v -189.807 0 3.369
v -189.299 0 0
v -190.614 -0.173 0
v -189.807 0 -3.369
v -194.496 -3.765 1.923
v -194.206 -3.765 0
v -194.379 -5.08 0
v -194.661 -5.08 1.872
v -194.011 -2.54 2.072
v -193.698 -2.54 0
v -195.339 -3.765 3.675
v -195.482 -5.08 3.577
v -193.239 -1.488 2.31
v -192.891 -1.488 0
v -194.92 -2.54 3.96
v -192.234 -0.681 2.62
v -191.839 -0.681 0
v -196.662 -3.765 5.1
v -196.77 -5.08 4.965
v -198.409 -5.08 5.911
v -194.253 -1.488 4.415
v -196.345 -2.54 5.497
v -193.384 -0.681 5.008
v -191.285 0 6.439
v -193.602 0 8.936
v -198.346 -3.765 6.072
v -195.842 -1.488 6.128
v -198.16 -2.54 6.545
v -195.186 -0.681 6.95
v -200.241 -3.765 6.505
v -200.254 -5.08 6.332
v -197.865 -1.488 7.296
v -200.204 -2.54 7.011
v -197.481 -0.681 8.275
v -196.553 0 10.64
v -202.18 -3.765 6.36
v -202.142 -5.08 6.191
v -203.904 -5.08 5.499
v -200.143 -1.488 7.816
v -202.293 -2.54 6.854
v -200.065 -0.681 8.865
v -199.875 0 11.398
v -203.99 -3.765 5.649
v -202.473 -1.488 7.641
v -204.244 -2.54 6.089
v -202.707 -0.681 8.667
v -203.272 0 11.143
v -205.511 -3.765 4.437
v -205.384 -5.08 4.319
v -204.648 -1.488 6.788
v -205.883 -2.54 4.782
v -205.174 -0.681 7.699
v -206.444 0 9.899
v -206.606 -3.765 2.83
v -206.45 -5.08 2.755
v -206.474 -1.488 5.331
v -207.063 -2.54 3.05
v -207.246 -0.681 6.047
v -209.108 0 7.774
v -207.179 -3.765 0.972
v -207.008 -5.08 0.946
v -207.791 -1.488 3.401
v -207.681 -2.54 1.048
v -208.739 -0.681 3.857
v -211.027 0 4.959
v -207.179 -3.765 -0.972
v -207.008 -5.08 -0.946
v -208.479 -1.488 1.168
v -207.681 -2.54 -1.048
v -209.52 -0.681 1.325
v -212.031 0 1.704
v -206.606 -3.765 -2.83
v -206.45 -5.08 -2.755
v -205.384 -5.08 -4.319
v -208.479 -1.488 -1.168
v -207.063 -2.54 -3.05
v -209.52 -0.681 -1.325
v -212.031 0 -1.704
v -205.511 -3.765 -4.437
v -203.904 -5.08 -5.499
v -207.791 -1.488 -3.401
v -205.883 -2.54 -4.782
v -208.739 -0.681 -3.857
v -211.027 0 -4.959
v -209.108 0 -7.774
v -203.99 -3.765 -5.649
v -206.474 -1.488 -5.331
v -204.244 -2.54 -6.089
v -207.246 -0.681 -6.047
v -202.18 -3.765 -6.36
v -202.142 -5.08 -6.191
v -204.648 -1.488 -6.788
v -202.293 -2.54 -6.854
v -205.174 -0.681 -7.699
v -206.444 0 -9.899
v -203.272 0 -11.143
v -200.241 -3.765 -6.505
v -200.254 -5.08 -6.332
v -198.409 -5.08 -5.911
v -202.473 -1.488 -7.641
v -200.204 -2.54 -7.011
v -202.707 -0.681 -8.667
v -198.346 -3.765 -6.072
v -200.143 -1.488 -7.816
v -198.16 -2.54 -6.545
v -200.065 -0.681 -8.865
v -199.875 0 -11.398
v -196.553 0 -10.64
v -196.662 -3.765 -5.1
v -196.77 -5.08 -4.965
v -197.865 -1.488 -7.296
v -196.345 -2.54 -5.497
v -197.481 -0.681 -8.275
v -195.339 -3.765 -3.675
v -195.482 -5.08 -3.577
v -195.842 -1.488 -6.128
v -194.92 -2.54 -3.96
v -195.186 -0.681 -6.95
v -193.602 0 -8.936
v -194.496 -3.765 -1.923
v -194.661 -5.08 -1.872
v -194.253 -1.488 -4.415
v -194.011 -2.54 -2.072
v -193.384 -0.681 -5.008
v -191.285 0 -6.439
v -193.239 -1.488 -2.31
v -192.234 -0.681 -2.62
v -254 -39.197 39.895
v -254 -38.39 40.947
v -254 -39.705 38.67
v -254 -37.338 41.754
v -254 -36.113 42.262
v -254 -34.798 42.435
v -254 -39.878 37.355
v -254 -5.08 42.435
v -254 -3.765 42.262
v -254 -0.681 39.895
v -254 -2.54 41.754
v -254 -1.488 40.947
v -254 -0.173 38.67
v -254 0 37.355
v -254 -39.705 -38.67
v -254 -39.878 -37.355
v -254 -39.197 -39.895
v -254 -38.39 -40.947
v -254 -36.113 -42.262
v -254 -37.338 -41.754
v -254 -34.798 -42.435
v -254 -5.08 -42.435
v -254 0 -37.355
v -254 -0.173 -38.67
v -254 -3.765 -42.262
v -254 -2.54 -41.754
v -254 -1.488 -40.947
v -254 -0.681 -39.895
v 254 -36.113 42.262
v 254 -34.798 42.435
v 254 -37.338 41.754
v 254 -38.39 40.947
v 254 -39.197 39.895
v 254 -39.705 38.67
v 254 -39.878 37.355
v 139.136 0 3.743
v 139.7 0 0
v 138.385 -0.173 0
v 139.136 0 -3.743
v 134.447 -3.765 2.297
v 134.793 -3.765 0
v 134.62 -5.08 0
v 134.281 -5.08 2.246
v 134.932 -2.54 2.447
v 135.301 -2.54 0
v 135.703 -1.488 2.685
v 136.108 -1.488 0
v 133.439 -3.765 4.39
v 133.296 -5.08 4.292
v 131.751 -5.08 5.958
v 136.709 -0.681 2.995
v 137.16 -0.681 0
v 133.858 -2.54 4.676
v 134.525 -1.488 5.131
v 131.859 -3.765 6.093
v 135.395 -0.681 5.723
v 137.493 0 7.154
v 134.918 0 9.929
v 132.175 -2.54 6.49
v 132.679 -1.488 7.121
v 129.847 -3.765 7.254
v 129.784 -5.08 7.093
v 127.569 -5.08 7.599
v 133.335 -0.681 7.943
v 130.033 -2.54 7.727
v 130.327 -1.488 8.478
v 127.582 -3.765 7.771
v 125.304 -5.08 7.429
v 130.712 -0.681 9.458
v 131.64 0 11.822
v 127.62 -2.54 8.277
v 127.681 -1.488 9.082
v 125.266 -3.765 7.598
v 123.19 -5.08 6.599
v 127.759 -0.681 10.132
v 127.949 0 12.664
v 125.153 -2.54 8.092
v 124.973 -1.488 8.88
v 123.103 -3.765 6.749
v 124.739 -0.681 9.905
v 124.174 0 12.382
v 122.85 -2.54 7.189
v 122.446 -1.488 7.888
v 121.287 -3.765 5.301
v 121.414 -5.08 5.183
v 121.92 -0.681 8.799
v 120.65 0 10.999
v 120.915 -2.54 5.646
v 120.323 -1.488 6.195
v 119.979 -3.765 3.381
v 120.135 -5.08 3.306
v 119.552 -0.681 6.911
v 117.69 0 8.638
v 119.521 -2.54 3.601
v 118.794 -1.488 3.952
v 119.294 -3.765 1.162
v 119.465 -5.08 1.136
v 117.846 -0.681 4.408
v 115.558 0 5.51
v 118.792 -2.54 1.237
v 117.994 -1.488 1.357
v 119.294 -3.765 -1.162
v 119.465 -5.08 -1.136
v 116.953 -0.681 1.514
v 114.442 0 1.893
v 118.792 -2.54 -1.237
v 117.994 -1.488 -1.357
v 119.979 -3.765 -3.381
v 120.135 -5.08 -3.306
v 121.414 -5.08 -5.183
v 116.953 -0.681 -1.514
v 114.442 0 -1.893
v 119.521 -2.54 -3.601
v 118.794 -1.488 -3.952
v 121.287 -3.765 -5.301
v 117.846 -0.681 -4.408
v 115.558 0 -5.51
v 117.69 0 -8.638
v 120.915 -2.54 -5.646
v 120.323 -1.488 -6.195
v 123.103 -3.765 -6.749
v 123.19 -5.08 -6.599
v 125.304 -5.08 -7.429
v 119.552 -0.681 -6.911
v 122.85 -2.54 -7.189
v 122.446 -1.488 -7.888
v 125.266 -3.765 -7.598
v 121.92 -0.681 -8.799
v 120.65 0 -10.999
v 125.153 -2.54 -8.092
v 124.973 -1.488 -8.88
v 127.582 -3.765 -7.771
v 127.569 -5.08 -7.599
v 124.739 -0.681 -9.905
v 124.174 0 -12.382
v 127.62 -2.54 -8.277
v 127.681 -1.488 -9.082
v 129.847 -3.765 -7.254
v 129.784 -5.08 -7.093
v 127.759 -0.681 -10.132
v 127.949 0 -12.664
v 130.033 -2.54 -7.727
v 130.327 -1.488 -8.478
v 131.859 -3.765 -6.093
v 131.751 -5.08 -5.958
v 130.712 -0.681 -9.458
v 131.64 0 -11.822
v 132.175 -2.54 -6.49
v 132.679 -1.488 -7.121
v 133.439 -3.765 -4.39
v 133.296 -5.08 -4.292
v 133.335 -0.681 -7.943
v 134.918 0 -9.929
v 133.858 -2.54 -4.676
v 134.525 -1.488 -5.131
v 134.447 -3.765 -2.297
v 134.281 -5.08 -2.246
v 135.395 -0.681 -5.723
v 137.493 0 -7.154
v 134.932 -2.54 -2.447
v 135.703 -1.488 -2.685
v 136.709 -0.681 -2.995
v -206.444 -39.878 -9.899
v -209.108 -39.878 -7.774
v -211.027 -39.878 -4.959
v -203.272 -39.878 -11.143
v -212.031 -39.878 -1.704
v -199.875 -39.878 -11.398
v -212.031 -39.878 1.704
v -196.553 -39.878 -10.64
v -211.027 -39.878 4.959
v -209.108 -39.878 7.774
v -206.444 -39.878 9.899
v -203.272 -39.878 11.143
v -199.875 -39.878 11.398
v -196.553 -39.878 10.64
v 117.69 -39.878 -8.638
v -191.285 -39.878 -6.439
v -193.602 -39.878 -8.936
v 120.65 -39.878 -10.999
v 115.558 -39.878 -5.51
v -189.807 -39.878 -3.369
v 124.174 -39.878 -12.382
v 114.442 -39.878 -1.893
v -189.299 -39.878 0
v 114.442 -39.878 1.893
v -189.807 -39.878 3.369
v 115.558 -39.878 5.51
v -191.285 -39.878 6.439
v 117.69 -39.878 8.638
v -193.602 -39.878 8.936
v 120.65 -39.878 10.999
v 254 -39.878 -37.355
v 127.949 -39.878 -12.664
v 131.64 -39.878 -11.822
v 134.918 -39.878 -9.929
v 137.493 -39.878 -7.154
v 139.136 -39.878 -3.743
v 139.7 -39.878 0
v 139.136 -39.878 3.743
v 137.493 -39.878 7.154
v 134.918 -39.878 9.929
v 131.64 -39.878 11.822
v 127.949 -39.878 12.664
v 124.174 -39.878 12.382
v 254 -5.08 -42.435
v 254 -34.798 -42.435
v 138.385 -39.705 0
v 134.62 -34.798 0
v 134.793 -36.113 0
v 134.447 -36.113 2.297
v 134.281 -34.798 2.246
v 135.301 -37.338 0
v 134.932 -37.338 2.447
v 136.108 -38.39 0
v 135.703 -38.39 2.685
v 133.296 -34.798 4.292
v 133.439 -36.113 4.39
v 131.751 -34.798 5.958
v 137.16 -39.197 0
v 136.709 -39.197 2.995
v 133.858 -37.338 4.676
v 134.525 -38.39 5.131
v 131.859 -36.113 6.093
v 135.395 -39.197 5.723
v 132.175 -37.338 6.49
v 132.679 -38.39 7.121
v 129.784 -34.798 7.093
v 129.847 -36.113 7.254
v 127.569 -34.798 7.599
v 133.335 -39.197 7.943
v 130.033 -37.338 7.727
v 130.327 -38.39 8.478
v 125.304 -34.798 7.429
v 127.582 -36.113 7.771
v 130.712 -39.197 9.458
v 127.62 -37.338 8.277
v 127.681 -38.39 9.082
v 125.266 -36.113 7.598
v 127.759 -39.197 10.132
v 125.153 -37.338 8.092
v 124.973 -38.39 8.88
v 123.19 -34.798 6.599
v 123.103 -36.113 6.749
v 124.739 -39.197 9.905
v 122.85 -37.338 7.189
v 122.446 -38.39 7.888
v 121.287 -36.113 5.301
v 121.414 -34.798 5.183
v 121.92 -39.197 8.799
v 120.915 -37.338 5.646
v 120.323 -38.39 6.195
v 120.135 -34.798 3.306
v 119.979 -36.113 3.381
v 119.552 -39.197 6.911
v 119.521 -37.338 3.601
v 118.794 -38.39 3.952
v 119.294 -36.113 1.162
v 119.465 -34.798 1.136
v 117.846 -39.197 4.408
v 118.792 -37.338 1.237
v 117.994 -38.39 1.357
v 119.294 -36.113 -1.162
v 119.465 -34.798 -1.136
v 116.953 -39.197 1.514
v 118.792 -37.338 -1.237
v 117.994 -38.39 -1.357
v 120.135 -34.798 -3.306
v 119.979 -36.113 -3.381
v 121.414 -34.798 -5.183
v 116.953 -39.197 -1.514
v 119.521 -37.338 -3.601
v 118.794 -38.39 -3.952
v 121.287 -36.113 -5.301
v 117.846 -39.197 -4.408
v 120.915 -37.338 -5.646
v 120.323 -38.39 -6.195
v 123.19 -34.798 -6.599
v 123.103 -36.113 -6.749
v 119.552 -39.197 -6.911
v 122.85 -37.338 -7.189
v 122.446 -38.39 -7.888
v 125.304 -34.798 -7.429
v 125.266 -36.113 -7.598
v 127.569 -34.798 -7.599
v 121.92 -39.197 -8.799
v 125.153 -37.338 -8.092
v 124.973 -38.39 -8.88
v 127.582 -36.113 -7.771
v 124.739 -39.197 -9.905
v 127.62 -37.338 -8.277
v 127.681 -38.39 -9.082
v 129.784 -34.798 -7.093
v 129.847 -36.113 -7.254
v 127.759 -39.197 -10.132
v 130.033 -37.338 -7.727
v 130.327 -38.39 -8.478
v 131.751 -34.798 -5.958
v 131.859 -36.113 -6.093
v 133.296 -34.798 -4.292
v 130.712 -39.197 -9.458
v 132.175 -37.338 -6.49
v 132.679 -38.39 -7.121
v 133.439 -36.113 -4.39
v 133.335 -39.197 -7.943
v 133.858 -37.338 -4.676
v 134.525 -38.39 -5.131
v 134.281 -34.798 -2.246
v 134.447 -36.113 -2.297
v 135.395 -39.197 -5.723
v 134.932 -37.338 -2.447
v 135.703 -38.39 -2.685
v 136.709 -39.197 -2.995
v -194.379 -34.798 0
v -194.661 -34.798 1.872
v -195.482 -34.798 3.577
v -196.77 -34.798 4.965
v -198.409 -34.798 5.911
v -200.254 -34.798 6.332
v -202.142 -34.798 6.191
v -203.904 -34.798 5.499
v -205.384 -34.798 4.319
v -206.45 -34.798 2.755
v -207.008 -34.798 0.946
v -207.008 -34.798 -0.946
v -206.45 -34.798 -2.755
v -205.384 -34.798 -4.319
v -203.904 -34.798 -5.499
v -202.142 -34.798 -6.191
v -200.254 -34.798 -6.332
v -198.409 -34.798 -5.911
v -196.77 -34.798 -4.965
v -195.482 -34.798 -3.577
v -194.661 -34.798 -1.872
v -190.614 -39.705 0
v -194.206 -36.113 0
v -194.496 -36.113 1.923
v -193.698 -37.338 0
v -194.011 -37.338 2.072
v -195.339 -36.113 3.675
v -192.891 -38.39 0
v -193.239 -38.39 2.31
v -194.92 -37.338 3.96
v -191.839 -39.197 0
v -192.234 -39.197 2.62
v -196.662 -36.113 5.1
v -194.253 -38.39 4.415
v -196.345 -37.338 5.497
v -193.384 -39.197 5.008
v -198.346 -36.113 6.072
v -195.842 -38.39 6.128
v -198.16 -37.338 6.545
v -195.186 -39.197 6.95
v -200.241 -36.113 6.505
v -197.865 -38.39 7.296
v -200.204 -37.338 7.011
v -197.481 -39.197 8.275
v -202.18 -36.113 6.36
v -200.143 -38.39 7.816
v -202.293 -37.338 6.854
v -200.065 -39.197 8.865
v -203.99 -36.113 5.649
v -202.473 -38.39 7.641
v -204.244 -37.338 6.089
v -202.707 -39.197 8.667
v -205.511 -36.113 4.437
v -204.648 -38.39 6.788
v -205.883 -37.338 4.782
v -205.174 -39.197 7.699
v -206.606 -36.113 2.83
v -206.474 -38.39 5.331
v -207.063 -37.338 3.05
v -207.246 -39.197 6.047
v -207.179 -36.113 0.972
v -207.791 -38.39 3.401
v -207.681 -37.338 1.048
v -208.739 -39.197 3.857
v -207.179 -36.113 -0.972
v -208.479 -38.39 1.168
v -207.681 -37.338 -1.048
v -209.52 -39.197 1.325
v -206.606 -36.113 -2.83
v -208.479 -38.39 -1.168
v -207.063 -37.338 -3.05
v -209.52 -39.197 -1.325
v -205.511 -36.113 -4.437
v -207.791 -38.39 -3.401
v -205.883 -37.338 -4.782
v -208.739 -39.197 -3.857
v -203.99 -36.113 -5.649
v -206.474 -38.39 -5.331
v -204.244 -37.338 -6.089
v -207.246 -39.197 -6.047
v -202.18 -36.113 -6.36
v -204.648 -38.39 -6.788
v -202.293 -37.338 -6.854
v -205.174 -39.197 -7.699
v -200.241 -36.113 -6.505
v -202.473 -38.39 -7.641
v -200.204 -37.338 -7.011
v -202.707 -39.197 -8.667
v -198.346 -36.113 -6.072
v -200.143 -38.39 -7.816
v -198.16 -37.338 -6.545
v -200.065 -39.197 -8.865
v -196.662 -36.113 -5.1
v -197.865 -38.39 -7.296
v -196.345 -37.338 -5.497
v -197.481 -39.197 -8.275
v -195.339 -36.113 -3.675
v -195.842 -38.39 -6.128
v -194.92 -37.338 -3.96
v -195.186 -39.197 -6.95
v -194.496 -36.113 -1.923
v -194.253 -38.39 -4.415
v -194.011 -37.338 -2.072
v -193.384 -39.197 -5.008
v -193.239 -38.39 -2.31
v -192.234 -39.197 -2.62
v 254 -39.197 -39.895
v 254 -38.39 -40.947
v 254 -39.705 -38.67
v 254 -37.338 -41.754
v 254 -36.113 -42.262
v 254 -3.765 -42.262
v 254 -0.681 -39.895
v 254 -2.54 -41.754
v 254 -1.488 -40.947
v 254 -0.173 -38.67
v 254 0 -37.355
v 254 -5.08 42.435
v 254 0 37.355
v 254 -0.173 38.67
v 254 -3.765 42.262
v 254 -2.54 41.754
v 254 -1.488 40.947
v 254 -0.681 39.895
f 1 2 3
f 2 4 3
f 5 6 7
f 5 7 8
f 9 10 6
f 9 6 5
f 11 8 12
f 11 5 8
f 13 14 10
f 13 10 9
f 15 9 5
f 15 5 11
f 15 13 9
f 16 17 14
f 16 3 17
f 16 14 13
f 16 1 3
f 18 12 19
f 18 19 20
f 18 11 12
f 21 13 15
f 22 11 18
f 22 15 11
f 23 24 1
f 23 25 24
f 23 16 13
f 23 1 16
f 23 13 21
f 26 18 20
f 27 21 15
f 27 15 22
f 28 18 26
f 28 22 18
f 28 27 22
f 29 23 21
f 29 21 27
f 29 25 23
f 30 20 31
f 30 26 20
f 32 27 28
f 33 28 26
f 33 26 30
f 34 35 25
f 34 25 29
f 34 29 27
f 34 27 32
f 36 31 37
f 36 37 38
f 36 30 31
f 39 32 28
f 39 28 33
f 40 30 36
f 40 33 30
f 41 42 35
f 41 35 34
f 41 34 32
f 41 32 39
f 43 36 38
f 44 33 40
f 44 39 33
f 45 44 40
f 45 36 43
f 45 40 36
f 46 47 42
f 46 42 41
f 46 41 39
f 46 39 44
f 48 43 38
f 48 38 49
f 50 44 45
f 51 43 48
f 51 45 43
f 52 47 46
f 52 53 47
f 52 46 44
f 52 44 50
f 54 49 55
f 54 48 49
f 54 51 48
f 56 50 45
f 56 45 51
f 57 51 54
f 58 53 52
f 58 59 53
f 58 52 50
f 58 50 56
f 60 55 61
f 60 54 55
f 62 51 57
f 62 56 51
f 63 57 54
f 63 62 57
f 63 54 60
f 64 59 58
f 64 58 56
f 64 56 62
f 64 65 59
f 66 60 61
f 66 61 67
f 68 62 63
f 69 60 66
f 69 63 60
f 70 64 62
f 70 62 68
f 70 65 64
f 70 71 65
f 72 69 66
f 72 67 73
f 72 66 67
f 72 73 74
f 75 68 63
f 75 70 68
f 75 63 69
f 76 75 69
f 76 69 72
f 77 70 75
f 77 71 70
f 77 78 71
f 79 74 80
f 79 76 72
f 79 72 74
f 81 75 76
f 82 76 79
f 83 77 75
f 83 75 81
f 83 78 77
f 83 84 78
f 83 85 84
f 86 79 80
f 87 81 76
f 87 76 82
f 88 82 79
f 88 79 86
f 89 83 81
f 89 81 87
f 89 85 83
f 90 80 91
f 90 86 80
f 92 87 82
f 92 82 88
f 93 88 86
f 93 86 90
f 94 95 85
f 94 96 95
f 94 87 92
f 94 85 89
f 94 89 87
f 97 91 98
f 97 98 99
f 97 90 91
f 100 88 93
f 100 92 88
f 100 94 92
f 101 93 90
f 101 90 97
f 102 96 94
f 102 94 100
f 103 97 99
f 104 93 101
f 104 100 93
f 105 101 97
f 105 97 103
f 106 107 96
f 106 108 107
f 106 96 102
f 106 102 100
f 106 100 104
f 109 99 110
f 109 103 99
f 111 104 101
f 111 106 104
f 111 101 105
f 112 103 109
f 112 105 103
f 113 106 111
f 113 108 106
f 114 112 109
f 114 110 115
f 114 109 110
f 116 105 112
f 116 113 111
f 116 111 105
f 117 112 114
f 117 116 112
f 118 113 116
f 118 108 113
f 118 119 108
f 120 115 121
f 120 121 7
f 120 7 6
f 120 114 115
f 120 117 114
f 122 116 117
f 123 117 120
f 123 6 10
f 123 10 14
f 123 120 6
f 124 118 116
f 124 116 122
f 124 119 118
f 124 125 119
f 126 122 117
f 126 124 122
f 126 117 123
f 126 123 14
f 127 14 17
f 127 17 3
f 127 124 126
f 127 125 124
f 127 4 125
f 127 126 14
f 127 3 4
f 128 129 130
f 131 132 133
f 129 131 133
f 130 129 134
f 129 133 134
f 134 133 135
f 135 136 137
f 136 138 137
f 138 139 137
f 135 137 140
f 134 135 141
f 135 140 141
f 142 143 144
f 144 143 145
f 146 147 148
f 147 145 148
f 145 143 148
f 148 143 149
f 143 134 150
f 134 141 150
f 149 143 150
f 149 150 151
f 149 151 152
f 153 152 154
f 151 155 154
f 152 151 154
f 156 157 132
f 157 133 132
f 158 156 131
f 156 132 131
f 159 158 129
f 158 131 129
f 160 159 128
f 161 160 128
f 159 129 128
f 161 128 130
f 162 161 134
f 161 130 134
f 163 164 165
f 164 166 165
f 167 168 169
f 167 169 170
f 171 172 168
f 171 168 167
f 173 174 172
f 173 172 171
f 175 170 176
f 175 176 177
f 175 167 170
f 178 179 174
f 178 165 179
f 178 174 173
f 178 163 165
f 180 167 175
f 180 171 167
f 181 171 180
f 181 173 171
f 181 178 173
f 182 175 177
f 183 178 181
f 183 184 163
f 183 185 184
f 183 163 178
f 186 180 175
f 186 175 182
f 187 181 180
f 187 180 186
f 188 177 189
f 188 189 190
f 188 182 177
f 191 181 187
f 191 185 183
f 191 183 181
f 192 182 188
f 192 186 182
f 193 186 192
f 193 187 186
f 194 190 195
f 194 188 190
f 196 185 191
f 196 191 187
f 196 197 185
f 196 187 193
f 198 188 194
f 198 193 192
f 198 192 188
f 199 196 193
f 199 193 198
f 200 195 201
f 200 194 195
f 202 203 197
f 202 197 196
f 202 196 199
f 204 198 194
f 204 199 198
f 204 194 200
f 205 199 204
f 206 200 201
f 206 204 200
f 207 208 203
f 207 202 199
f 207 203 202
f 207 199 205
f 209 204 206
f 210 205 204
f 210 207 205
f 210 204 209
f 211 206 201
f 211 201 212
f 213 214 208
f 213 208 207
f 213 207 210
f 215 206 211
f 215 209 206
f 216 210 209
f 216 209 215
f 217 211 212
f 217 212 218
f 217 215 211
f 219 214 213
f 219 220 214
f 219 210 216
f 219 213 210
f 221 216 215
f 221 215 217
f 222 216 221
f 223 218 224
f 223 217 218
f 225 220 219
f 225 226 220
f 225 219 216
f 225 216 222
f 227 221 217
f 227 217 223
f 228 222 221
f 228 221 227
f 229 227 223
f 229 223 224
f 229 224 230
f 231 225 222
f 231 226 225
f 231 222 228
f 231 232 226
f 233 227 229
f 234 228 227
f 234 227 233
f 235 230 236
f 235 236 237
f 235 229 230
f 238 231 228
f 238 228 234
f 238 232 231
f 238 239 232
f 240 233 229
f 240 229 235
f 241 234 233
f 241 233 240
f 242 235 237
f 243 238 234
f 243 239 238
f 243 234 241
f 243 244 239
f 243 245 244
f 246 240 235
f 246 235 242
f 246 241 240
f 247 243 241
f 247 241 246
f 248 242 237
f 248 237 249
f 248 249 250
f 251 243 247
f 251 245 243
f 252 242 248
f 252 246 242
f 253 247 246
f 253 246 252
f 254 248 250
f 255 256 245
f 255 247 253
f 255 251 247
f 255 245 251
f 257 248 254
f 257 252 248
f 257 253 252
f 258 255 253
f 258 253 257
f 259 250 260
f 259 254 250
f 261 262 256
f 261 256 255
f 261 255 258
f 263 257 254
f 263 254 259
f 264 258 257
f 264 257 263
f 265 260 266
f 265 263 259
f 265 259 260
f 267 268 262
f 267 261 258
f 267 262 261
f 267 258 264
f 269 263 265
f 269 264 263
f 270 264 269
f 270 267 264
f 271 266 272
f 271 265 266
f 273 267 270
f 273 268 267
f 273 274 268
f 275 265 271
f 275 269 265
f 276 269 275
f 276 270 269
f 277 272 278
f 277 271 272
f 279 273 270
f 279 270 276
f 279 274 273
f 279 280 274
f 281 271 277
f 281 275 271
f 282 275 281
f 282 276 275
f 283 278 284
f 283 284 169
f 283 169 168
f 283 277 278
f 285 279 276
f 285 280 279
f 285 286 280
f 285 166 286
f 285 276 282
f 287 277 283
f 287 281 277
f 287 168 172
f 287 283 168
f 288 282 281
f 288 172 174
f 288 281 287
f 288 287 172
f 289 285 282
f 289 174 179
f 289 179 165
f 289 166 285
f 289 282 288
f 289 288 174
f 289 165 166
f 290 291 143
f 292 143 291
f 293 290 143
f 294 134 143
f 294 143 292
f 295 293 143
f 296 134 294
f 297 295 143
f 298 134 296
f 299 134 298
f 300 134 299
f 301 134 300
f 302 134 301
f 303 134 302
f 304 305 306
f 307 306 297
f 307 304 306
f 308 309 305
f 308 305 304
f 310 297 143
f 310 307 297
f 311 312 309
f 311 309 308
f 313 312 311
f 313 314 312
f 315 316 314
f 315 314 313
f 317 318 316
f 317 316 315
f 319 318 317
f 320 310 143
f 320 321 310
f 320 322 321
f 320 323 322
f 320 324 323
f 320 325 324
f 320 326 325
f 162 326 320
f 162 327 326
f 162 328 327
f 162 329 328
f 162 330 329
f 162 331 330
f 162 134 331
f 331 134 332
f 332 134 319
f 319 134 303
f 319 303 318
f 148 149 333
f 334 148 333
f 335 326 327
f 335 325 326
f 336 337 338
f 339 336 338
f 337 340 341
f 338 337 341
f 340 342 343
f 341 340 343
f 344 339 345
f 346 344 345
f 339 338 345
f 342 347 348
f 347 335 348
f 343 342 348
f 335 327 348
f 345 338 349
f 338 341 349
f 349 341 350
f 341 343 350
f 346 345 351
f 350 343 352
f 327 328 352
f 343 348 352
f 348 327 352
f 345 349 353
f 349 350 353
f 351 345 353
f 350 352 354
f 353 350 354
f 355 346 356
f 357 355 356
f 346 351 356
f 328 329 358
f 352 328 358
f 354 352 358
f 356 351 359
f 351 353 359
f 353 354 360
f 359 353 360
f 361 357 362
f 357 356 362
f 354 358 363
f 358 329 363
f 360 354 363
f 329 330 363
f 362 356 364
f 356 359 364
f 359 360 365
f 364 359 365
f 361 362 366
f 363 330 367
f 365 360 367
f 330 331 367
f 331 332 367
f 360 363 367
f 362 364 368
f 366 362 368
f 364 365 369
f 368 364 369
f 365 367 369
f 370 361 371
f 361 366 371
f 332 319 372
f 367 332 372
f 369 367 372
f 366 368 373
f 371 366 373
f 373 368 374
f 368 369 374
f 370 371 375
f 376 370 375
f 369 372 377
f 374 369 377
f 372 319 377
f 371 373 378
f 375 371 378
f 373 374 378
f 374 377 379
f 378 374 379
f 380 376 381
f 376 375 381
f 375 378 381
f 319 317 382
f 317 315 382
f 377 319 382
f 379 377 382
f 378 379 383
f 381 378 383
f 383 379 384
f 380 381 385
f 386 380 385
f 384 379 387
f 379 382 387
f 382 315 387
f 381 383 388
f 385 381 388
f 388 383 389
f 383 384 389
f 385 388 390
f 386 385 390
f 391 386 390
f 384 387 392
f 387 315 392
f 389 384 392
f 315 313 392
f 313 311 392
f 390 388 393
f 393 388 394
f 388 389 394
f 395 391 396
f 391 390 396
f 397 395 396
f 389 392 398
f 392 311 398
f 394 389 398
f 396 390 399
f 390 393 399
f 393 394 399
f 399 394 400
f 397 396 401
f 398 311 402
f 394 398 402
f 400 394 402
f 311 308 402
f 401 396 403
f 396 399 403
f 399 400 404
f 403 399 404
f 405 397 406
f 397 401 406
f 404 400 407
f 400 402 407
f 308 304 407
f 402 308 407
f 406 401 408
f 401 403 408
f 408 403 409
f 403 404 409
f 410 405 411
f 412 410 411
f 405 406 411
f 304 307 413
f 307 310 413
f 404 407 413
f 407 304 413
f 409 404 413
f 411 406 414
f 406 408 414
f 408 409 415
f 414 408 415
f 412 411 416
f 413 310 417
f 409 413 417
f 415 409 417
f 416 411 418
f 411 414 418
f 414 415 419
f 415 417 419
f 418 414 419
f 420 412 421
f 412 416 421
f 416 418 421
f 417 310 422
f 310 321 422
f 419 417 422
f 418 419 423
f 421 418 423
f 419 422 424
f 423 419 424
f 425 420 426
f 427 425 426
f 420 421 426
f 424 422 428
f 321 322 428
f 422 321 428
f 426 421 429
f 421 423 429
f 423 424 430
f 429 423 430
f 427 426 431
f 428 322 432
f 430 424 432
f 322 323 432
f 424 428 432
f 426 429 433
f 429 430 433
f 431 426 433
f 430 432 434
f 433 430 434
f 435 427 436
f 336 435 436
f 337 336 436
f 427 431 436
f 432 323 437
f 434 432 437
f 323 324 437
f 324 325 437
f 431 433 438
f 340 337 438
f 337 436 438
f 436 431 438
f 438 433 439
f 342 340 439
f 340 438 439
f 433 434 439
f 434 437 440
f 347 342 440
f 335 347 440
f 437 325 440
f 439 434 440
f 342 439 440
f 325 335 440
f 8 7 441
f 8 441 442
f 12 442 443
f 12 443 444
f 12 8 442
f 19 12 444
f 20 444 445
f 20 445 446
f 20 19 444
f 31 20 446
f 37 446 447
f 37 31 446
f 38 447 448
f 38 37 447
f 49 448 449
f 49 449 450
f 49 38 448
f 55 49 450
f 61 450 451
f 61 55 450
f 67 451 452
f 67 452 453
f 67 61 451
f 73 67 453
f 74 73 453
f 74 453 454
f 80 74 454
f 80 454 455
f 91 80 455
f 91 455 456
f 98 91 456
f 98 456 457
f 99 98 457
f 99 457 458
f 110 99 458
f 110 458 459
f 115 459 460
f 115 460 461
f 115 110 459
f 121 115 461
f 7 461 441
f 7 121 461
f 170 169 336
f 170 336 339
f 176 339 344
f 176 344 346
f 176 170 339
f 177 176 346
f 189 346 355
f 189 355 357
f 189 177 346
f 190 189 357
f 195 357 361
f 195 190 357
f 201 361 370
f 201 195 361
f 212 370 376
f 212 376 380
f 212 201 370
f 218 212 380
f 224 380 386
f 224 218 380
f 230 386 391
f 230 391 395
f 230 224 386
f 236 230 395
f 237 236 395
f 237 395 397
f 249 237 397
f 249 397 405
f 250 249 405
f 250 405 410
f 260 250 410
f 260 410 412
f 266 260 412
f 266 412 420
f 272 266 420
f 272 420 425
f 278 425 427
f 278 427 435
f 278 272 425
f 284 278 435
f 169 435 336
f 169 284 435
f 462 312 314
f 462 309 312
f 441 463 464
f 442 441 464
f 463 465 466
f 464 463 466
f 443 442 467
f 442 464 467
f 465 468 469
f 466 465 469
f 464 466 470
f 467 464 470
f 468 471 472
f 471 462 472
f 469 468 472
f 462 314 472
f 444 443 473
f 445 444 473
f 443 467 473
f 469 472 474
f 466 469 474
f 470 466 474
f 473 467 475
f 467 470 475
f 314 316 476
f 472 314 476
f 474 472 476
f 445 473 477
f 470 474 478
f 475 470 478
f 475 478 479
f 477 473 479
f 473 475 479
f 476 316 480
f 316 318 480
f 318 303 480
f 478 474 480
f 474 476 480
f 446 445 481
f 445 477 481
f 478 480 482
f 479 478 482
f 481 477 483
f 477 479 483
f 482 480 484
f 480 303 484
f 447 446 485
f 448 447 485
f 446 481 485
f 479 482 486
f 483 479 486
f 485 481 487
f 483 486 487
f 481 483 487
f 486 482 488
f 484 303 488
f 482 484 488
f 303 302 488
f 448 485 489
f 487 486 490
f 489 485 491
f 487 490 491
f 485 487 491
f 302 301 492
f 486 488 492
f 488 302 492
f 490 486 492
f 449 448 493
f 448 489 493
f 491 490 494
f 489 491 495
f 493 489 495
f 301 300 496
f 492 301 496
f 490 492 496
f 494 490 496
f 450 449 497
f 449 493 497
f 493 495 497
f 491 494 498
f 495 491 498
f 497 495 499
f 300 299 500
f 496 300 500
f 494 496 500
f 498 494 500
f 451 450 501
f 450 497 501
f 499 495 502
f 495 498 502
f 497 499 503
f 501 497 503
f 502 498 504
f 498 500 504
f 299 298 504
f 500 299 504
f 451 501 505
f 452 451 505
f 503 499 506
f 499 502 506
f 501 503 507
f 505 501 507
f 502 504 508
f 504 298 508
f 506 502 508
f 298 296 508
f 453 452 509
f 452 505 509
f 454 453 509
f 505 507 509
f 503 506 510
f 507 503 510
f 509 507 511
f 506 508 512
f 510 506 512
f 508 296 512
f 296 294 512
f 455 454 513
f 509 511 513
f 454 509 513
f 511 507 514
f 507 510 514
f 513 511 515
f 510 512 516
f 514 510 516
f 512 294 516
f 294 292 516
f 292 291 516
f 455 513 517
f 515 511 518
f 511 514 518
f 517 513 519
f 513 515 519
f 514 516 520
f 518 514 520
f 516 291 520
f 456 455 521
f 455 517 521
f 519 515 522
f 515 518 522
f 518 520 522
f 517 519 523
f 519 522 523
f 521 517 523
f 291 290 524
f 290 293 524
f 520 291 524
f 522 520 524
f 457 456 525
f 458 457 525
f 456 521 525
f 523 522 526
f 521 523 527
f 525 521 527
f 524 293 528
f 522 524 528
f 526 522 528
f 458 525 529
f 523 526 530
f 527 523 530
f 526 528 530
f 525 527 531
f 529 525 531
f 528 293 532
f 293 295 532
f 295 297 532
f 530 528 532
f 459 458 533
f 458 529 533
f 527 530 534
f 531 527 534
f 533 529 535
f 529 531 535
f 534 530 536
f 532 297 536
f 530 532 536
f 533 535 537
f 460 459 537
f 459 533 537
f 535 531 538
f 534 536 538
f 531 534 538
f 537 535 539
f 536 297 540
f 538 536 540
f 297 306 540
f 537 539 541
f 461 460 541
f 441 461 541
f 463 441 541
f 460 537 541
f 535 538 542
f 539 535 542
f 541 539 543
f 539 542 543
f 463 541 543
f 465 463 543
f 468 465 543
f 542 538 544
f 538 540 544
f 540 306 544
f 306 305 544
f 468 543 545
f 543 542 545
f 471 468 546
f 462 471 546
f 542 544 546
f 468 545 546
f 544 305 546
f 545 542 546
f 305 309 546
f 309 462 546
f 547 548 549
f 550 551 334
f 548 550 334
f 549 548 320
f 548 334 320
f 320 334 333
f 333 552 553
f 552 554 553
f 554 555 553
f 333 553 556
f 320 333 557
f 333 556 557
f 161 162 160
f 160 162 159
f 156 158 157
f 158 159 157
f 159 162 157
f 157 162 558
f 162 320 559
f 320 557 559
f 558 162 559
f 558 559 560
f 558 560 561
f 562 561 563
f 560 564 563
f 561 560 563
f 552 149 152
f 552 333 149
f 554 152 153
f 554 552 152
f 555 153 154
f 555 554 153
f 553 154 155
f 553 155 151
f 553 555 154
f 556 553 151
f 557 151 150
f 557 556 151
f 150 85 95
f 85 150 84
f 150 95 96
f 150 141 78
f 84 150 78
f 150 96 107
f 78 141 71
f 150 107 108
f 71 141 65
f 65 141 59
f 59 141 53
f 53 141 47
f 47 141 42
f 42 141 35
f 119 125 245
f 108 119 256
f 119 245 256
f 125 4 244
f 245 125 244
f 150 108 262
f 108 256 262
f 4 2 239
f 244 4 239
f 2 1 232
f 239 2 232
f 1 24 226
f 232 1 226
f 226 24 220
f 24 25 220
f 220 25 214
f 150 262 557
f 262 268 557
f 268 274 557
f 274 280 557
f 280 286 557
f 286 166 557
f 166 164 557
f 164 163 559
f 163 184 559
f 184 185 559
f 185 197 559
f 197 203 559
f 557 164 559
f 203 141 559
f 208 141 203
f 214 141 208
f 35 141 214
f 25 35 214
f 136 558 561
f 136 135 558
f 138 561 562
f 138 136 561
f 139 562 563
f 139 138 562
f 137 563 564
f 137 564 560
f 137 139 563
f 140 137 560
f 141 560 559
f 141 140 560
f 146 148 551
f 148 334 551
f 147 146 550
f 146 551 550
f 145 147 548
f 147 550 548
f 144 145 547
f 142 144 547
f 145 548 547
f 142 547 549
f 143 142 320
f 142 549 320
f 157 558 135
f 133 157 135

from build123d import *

# Parameters (mm, degrees)
F0_R     = 6.35
F0_R_2   = 7.62
F1_DEPTH = 39.878
F2_R     = 5.08


with BuildPart() as f1:
    # F0 (on Front) → F1 (new body)
    with BuildSketch(Plane.XZ):
        Polygon((-254, -42.434722), (254, -42.434722), (254, 42.434722), (127, 42.434722), (-200.728908, 42.434722), (-254, 42.434722), align=None)
        with Locations((-200.728908, 0)):
            Circle(F0_R, mode=Mode.SUBTRACT)
        with Locations((127, 0)):
            Circle(F0_R_2, mode=Mode.SUBTRACT)
    extrude(amount=F1_DEPTH)

    # F2
    f2_edges = [f1.edges().sort_by_distance(p)[0] for p in [
        (0, 0, 42.434722),
        (0, 0, -42.434722),
        (119.38, 0, 0),
        (-207.078908, 0, 0),
        (0, -39.878, 42.434722),
        (0, -39.878, -42.434722),
        (-207.078908, -39.878, 0),
        (119.38, -39.878, 0),
    ]]
    fillet(f2_edges, radius=F2_R)


solid = f1.part
